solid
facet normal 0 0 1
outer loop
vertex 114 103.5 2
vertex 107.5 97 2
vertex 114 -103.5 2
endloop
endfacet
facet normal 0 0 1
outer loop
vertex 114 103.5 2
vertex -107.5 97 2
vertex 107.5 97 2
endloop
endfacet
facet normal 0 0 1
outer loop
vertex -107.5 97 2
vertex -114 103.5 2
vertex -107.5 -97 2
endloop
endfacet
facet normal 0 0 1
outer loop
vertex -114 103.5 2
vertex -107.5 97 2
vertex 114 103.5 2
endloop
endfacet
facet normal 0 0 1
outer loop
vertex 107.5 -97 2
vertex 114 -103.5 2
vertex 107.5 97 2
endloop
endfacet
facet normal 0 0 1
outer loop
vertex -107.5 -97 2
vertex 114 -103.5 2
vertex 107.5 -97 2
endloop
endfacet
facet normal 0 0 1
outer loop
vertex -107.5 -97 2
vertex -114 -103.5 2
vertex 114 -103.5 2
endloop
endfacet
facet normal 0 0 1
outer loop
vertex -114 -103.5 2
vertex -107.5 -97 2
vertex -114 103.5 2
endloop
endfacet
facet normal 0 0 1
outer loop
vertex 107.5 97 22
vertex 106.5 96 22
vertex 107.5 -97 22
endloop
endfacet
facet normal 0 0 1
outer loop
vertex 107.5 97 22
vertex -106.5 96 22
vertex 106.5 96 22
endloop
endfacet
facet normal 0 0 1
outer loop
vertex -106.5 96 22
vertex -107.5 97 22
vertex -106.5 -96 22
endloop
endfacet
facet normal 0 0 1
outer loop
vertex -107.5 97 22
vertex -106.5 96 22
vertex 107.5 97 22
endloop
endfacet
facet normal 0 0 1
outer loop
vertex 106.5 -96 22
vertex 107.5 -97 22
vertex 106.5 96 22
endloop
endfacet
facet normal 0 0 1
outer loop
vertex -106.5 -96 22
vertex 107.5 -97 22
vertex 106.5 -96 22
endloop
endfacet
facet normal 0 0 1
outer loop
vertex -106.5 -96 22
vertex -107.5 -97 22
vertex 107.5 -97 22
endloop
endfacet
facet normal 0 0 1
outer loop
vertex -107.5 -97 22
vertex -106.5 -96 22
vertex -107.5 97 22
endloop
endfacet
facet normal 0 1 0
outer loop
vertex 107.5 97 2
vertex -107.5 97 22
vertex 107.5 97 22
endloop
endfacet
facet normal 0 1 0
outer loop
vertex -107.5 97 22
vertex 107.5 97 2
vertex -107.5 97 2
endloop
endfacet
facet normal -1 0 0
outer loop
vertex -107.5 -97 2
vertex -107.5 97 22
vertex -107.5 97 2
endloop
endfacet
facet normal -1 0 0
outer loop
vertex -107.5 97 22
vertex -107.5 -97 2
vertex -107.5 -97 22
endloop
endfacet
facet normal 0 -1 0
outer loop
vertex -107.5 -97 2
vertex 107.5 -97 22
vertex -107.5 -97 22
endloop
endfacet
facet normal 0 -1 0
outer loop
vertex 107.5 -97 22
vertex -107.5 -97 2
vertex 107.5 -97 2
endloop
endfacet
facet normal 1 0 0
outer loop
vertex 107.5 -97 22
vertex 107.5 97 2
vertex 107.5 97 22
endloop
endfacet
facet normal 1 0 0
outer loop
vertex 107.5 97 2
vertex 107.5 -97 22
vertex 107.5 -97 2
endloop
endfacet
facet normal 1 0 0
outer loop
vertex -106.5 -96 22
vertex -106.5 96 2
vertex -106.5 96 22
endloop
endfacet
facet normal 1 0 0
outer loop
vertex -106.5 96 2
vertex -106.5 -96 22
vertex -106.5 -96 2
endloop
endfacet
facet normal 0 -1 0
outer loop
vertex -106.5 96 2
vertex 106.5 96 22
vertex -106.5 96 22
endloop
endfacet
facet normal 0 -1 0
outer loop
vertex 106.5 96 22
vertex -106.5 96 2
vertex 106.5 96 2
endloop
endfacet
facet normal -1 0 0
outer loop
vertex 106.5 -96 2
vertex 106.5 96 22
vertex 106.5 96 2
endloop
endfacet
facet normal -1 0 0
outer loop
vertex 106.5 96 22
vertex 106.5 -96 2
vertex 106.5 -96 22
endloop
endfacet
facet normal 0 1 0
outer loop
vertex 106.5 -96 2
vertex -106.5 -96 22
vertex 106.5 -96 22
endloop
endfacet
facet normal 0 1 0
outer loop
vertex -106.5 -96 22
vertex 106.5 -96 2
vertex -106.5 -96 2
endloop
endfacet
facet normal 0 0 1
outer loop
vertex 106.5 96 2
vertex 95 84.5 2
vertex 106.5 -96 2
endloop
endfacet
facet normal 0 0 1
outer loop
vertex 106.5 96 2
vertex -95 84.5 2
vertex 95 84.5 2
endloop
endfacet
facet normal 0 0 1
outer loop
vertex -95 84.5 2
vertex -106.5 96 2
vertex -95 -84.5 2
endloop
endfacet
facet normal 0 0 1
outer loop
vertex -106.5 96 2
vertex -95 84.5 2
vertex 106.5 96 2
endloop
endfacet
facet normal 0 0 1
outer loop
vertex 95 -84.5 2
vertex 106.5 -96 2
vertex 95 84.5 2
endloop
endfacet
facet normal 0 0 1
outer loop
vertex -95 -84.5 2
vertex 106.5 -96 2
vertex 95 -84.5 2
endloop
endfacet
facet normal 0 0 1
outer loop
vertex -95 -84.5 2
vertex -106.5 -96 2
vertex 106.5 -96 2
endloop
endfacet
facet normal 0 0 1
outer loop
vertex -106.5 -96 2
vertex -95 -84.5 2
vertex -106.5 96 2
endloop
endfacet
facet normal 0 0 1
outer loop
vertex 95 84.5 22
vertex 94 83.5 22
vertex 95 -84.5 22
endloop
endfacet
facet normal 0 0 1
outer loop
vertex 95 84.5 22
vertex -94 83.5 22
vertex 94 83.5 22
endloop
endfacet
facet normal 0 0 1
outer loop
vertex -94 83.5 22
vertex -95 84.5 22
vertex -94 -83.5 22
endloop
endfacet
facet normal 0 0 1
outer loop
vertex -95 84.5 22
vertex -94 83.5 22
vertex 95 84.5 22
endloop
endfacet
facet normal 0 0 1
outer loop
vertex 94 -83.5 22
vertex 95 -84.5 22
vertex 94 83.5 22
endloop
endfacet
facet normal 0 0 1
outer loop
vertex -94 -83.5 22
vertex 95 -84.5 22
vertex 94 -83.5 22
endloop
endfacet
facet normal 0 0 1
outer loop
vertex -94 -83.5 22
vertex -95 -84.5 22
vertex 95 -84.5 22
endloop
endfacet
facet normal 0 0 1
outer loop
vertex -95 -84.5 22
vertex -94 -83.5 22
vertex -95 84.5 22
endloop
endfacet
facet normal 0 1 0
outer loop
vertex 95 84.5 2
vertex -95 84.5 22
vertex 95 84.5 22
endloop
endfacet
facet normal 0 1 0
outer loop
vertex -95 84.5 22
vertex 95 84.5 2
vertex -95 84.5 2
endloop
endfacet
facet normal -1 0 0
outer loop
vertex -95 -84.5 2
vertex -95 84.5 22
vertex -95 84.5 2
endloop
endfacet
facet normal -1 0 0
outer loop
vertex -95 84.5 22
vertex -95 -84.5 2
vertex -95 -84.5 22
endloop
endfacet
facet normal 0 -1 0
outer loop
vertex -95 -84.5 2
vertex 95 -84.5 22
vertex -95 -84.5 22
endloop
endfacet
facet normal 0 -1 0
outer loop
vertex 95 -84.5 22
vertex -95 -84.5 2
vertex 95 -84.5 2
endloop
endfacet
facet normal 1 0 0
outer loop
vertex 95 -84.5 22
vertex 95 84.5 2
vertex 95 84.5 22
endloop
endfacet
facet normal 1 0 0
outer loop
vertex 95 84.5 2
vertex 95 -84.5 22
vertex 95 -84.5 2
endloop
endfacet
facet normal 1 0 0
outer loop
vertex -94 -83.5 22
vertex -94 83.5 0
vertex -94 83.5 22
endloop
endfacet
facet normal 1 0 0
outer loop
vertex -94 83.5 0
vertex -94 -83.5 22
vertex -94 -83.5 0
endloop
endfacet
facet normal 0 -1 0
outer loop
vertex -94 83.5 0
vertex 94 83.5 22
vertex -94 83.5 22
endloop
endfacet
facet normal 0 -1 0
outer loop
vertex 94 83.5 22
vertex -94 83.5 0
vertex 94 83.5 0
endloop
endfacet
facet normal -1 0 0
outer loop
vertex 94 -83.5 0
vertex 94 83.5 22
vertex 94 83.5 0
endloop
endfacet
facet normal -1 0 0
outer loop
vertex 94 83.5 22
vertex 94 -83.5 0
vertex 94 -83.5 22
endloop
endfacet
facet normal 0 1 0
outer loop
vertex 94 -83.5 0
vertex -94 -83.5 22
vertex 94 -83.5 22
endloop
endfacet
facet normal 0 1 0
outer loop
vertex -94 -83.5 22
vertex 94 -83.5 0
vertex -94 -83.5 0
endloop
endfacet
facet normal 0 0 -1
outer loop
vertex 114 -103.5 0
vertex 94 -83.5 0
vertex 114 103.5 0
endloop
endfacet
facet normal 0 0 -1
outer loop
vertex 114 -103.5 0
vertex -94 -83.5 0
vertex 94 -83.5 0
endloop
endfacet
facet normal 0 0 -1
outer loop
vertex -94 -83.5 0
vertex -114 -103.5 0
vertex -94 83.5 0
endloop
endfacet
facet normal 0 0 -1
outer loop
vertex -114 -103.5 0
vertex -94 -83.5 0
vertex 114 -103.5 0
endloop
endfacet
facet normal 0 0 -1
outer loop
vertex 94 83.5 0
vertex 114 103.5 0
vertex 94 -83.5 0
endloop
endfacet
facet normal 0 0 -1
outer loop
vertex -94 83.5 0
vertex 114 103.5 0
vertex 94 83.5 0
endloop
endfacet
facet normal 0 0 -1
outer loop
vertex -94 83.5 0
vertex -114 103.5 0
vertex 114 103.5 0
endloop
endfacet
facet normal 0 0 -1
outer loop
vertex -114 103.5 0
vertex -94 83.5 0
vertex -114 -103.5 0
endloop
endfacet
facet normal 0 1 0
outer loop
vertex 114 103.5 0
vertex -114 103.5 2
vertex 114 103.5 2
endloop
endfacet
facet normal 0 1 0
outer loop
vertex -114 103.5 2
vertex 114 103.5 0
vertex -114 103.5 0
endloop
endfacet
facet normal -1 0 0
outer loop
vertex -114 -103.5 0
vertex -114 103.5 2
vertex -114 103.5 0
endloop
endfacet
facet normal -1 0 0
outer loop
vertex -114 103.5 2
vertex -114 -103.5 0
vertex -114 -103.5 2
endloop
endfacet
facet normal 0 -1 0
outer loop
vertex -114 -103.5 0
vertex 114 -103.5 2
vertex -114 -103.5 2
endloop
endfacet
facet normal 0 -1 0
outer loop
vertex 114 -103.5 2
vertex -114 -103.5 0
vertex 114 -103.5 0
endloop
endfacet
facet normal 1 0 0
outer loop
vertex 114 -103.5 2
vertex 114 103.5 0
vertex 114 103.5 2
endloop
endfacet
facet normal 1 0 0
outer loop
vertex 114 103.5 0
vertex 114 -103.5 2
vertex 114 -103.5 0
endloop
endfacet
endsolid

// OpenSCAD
overhang=15;
depth=20;
innerOverhang=25;
innerWidth=213;
innerHeight=192;
wallThickness=2;

union() {
    translate([0,0,wallThickness])
    linear_extrude(depth)
    difference() {
        square([innerWidth+wallThickness,innerHeight+wallThickness], true);
        square([innerWidth,innerHeight], true);
    }
    
    translate([0,0,wallThickness])
    linear_extrude(depth)
    difference() {
        square([(innerWidth-innerOverhang)+wallThickness,(innerHeight-innerOverhang)+wallThickness], true);
        square([(innerWidth-innerOverhang),(innerHeight-innerOverhang)], true);
    }

    linear_extrude(wallThickness)
    difference() {
        square([innerWidth+overhang,innerHeight+overhang], true);
        square([innerWidth,innerHeight], true);
    }
    
    linear_extrude(wallThickness)
    difference() {
        square([innerWidth,innerHeight], true);
        square([innerWidth-innerOverhang,innerHeight-innerOverhang], true);
    }
}
